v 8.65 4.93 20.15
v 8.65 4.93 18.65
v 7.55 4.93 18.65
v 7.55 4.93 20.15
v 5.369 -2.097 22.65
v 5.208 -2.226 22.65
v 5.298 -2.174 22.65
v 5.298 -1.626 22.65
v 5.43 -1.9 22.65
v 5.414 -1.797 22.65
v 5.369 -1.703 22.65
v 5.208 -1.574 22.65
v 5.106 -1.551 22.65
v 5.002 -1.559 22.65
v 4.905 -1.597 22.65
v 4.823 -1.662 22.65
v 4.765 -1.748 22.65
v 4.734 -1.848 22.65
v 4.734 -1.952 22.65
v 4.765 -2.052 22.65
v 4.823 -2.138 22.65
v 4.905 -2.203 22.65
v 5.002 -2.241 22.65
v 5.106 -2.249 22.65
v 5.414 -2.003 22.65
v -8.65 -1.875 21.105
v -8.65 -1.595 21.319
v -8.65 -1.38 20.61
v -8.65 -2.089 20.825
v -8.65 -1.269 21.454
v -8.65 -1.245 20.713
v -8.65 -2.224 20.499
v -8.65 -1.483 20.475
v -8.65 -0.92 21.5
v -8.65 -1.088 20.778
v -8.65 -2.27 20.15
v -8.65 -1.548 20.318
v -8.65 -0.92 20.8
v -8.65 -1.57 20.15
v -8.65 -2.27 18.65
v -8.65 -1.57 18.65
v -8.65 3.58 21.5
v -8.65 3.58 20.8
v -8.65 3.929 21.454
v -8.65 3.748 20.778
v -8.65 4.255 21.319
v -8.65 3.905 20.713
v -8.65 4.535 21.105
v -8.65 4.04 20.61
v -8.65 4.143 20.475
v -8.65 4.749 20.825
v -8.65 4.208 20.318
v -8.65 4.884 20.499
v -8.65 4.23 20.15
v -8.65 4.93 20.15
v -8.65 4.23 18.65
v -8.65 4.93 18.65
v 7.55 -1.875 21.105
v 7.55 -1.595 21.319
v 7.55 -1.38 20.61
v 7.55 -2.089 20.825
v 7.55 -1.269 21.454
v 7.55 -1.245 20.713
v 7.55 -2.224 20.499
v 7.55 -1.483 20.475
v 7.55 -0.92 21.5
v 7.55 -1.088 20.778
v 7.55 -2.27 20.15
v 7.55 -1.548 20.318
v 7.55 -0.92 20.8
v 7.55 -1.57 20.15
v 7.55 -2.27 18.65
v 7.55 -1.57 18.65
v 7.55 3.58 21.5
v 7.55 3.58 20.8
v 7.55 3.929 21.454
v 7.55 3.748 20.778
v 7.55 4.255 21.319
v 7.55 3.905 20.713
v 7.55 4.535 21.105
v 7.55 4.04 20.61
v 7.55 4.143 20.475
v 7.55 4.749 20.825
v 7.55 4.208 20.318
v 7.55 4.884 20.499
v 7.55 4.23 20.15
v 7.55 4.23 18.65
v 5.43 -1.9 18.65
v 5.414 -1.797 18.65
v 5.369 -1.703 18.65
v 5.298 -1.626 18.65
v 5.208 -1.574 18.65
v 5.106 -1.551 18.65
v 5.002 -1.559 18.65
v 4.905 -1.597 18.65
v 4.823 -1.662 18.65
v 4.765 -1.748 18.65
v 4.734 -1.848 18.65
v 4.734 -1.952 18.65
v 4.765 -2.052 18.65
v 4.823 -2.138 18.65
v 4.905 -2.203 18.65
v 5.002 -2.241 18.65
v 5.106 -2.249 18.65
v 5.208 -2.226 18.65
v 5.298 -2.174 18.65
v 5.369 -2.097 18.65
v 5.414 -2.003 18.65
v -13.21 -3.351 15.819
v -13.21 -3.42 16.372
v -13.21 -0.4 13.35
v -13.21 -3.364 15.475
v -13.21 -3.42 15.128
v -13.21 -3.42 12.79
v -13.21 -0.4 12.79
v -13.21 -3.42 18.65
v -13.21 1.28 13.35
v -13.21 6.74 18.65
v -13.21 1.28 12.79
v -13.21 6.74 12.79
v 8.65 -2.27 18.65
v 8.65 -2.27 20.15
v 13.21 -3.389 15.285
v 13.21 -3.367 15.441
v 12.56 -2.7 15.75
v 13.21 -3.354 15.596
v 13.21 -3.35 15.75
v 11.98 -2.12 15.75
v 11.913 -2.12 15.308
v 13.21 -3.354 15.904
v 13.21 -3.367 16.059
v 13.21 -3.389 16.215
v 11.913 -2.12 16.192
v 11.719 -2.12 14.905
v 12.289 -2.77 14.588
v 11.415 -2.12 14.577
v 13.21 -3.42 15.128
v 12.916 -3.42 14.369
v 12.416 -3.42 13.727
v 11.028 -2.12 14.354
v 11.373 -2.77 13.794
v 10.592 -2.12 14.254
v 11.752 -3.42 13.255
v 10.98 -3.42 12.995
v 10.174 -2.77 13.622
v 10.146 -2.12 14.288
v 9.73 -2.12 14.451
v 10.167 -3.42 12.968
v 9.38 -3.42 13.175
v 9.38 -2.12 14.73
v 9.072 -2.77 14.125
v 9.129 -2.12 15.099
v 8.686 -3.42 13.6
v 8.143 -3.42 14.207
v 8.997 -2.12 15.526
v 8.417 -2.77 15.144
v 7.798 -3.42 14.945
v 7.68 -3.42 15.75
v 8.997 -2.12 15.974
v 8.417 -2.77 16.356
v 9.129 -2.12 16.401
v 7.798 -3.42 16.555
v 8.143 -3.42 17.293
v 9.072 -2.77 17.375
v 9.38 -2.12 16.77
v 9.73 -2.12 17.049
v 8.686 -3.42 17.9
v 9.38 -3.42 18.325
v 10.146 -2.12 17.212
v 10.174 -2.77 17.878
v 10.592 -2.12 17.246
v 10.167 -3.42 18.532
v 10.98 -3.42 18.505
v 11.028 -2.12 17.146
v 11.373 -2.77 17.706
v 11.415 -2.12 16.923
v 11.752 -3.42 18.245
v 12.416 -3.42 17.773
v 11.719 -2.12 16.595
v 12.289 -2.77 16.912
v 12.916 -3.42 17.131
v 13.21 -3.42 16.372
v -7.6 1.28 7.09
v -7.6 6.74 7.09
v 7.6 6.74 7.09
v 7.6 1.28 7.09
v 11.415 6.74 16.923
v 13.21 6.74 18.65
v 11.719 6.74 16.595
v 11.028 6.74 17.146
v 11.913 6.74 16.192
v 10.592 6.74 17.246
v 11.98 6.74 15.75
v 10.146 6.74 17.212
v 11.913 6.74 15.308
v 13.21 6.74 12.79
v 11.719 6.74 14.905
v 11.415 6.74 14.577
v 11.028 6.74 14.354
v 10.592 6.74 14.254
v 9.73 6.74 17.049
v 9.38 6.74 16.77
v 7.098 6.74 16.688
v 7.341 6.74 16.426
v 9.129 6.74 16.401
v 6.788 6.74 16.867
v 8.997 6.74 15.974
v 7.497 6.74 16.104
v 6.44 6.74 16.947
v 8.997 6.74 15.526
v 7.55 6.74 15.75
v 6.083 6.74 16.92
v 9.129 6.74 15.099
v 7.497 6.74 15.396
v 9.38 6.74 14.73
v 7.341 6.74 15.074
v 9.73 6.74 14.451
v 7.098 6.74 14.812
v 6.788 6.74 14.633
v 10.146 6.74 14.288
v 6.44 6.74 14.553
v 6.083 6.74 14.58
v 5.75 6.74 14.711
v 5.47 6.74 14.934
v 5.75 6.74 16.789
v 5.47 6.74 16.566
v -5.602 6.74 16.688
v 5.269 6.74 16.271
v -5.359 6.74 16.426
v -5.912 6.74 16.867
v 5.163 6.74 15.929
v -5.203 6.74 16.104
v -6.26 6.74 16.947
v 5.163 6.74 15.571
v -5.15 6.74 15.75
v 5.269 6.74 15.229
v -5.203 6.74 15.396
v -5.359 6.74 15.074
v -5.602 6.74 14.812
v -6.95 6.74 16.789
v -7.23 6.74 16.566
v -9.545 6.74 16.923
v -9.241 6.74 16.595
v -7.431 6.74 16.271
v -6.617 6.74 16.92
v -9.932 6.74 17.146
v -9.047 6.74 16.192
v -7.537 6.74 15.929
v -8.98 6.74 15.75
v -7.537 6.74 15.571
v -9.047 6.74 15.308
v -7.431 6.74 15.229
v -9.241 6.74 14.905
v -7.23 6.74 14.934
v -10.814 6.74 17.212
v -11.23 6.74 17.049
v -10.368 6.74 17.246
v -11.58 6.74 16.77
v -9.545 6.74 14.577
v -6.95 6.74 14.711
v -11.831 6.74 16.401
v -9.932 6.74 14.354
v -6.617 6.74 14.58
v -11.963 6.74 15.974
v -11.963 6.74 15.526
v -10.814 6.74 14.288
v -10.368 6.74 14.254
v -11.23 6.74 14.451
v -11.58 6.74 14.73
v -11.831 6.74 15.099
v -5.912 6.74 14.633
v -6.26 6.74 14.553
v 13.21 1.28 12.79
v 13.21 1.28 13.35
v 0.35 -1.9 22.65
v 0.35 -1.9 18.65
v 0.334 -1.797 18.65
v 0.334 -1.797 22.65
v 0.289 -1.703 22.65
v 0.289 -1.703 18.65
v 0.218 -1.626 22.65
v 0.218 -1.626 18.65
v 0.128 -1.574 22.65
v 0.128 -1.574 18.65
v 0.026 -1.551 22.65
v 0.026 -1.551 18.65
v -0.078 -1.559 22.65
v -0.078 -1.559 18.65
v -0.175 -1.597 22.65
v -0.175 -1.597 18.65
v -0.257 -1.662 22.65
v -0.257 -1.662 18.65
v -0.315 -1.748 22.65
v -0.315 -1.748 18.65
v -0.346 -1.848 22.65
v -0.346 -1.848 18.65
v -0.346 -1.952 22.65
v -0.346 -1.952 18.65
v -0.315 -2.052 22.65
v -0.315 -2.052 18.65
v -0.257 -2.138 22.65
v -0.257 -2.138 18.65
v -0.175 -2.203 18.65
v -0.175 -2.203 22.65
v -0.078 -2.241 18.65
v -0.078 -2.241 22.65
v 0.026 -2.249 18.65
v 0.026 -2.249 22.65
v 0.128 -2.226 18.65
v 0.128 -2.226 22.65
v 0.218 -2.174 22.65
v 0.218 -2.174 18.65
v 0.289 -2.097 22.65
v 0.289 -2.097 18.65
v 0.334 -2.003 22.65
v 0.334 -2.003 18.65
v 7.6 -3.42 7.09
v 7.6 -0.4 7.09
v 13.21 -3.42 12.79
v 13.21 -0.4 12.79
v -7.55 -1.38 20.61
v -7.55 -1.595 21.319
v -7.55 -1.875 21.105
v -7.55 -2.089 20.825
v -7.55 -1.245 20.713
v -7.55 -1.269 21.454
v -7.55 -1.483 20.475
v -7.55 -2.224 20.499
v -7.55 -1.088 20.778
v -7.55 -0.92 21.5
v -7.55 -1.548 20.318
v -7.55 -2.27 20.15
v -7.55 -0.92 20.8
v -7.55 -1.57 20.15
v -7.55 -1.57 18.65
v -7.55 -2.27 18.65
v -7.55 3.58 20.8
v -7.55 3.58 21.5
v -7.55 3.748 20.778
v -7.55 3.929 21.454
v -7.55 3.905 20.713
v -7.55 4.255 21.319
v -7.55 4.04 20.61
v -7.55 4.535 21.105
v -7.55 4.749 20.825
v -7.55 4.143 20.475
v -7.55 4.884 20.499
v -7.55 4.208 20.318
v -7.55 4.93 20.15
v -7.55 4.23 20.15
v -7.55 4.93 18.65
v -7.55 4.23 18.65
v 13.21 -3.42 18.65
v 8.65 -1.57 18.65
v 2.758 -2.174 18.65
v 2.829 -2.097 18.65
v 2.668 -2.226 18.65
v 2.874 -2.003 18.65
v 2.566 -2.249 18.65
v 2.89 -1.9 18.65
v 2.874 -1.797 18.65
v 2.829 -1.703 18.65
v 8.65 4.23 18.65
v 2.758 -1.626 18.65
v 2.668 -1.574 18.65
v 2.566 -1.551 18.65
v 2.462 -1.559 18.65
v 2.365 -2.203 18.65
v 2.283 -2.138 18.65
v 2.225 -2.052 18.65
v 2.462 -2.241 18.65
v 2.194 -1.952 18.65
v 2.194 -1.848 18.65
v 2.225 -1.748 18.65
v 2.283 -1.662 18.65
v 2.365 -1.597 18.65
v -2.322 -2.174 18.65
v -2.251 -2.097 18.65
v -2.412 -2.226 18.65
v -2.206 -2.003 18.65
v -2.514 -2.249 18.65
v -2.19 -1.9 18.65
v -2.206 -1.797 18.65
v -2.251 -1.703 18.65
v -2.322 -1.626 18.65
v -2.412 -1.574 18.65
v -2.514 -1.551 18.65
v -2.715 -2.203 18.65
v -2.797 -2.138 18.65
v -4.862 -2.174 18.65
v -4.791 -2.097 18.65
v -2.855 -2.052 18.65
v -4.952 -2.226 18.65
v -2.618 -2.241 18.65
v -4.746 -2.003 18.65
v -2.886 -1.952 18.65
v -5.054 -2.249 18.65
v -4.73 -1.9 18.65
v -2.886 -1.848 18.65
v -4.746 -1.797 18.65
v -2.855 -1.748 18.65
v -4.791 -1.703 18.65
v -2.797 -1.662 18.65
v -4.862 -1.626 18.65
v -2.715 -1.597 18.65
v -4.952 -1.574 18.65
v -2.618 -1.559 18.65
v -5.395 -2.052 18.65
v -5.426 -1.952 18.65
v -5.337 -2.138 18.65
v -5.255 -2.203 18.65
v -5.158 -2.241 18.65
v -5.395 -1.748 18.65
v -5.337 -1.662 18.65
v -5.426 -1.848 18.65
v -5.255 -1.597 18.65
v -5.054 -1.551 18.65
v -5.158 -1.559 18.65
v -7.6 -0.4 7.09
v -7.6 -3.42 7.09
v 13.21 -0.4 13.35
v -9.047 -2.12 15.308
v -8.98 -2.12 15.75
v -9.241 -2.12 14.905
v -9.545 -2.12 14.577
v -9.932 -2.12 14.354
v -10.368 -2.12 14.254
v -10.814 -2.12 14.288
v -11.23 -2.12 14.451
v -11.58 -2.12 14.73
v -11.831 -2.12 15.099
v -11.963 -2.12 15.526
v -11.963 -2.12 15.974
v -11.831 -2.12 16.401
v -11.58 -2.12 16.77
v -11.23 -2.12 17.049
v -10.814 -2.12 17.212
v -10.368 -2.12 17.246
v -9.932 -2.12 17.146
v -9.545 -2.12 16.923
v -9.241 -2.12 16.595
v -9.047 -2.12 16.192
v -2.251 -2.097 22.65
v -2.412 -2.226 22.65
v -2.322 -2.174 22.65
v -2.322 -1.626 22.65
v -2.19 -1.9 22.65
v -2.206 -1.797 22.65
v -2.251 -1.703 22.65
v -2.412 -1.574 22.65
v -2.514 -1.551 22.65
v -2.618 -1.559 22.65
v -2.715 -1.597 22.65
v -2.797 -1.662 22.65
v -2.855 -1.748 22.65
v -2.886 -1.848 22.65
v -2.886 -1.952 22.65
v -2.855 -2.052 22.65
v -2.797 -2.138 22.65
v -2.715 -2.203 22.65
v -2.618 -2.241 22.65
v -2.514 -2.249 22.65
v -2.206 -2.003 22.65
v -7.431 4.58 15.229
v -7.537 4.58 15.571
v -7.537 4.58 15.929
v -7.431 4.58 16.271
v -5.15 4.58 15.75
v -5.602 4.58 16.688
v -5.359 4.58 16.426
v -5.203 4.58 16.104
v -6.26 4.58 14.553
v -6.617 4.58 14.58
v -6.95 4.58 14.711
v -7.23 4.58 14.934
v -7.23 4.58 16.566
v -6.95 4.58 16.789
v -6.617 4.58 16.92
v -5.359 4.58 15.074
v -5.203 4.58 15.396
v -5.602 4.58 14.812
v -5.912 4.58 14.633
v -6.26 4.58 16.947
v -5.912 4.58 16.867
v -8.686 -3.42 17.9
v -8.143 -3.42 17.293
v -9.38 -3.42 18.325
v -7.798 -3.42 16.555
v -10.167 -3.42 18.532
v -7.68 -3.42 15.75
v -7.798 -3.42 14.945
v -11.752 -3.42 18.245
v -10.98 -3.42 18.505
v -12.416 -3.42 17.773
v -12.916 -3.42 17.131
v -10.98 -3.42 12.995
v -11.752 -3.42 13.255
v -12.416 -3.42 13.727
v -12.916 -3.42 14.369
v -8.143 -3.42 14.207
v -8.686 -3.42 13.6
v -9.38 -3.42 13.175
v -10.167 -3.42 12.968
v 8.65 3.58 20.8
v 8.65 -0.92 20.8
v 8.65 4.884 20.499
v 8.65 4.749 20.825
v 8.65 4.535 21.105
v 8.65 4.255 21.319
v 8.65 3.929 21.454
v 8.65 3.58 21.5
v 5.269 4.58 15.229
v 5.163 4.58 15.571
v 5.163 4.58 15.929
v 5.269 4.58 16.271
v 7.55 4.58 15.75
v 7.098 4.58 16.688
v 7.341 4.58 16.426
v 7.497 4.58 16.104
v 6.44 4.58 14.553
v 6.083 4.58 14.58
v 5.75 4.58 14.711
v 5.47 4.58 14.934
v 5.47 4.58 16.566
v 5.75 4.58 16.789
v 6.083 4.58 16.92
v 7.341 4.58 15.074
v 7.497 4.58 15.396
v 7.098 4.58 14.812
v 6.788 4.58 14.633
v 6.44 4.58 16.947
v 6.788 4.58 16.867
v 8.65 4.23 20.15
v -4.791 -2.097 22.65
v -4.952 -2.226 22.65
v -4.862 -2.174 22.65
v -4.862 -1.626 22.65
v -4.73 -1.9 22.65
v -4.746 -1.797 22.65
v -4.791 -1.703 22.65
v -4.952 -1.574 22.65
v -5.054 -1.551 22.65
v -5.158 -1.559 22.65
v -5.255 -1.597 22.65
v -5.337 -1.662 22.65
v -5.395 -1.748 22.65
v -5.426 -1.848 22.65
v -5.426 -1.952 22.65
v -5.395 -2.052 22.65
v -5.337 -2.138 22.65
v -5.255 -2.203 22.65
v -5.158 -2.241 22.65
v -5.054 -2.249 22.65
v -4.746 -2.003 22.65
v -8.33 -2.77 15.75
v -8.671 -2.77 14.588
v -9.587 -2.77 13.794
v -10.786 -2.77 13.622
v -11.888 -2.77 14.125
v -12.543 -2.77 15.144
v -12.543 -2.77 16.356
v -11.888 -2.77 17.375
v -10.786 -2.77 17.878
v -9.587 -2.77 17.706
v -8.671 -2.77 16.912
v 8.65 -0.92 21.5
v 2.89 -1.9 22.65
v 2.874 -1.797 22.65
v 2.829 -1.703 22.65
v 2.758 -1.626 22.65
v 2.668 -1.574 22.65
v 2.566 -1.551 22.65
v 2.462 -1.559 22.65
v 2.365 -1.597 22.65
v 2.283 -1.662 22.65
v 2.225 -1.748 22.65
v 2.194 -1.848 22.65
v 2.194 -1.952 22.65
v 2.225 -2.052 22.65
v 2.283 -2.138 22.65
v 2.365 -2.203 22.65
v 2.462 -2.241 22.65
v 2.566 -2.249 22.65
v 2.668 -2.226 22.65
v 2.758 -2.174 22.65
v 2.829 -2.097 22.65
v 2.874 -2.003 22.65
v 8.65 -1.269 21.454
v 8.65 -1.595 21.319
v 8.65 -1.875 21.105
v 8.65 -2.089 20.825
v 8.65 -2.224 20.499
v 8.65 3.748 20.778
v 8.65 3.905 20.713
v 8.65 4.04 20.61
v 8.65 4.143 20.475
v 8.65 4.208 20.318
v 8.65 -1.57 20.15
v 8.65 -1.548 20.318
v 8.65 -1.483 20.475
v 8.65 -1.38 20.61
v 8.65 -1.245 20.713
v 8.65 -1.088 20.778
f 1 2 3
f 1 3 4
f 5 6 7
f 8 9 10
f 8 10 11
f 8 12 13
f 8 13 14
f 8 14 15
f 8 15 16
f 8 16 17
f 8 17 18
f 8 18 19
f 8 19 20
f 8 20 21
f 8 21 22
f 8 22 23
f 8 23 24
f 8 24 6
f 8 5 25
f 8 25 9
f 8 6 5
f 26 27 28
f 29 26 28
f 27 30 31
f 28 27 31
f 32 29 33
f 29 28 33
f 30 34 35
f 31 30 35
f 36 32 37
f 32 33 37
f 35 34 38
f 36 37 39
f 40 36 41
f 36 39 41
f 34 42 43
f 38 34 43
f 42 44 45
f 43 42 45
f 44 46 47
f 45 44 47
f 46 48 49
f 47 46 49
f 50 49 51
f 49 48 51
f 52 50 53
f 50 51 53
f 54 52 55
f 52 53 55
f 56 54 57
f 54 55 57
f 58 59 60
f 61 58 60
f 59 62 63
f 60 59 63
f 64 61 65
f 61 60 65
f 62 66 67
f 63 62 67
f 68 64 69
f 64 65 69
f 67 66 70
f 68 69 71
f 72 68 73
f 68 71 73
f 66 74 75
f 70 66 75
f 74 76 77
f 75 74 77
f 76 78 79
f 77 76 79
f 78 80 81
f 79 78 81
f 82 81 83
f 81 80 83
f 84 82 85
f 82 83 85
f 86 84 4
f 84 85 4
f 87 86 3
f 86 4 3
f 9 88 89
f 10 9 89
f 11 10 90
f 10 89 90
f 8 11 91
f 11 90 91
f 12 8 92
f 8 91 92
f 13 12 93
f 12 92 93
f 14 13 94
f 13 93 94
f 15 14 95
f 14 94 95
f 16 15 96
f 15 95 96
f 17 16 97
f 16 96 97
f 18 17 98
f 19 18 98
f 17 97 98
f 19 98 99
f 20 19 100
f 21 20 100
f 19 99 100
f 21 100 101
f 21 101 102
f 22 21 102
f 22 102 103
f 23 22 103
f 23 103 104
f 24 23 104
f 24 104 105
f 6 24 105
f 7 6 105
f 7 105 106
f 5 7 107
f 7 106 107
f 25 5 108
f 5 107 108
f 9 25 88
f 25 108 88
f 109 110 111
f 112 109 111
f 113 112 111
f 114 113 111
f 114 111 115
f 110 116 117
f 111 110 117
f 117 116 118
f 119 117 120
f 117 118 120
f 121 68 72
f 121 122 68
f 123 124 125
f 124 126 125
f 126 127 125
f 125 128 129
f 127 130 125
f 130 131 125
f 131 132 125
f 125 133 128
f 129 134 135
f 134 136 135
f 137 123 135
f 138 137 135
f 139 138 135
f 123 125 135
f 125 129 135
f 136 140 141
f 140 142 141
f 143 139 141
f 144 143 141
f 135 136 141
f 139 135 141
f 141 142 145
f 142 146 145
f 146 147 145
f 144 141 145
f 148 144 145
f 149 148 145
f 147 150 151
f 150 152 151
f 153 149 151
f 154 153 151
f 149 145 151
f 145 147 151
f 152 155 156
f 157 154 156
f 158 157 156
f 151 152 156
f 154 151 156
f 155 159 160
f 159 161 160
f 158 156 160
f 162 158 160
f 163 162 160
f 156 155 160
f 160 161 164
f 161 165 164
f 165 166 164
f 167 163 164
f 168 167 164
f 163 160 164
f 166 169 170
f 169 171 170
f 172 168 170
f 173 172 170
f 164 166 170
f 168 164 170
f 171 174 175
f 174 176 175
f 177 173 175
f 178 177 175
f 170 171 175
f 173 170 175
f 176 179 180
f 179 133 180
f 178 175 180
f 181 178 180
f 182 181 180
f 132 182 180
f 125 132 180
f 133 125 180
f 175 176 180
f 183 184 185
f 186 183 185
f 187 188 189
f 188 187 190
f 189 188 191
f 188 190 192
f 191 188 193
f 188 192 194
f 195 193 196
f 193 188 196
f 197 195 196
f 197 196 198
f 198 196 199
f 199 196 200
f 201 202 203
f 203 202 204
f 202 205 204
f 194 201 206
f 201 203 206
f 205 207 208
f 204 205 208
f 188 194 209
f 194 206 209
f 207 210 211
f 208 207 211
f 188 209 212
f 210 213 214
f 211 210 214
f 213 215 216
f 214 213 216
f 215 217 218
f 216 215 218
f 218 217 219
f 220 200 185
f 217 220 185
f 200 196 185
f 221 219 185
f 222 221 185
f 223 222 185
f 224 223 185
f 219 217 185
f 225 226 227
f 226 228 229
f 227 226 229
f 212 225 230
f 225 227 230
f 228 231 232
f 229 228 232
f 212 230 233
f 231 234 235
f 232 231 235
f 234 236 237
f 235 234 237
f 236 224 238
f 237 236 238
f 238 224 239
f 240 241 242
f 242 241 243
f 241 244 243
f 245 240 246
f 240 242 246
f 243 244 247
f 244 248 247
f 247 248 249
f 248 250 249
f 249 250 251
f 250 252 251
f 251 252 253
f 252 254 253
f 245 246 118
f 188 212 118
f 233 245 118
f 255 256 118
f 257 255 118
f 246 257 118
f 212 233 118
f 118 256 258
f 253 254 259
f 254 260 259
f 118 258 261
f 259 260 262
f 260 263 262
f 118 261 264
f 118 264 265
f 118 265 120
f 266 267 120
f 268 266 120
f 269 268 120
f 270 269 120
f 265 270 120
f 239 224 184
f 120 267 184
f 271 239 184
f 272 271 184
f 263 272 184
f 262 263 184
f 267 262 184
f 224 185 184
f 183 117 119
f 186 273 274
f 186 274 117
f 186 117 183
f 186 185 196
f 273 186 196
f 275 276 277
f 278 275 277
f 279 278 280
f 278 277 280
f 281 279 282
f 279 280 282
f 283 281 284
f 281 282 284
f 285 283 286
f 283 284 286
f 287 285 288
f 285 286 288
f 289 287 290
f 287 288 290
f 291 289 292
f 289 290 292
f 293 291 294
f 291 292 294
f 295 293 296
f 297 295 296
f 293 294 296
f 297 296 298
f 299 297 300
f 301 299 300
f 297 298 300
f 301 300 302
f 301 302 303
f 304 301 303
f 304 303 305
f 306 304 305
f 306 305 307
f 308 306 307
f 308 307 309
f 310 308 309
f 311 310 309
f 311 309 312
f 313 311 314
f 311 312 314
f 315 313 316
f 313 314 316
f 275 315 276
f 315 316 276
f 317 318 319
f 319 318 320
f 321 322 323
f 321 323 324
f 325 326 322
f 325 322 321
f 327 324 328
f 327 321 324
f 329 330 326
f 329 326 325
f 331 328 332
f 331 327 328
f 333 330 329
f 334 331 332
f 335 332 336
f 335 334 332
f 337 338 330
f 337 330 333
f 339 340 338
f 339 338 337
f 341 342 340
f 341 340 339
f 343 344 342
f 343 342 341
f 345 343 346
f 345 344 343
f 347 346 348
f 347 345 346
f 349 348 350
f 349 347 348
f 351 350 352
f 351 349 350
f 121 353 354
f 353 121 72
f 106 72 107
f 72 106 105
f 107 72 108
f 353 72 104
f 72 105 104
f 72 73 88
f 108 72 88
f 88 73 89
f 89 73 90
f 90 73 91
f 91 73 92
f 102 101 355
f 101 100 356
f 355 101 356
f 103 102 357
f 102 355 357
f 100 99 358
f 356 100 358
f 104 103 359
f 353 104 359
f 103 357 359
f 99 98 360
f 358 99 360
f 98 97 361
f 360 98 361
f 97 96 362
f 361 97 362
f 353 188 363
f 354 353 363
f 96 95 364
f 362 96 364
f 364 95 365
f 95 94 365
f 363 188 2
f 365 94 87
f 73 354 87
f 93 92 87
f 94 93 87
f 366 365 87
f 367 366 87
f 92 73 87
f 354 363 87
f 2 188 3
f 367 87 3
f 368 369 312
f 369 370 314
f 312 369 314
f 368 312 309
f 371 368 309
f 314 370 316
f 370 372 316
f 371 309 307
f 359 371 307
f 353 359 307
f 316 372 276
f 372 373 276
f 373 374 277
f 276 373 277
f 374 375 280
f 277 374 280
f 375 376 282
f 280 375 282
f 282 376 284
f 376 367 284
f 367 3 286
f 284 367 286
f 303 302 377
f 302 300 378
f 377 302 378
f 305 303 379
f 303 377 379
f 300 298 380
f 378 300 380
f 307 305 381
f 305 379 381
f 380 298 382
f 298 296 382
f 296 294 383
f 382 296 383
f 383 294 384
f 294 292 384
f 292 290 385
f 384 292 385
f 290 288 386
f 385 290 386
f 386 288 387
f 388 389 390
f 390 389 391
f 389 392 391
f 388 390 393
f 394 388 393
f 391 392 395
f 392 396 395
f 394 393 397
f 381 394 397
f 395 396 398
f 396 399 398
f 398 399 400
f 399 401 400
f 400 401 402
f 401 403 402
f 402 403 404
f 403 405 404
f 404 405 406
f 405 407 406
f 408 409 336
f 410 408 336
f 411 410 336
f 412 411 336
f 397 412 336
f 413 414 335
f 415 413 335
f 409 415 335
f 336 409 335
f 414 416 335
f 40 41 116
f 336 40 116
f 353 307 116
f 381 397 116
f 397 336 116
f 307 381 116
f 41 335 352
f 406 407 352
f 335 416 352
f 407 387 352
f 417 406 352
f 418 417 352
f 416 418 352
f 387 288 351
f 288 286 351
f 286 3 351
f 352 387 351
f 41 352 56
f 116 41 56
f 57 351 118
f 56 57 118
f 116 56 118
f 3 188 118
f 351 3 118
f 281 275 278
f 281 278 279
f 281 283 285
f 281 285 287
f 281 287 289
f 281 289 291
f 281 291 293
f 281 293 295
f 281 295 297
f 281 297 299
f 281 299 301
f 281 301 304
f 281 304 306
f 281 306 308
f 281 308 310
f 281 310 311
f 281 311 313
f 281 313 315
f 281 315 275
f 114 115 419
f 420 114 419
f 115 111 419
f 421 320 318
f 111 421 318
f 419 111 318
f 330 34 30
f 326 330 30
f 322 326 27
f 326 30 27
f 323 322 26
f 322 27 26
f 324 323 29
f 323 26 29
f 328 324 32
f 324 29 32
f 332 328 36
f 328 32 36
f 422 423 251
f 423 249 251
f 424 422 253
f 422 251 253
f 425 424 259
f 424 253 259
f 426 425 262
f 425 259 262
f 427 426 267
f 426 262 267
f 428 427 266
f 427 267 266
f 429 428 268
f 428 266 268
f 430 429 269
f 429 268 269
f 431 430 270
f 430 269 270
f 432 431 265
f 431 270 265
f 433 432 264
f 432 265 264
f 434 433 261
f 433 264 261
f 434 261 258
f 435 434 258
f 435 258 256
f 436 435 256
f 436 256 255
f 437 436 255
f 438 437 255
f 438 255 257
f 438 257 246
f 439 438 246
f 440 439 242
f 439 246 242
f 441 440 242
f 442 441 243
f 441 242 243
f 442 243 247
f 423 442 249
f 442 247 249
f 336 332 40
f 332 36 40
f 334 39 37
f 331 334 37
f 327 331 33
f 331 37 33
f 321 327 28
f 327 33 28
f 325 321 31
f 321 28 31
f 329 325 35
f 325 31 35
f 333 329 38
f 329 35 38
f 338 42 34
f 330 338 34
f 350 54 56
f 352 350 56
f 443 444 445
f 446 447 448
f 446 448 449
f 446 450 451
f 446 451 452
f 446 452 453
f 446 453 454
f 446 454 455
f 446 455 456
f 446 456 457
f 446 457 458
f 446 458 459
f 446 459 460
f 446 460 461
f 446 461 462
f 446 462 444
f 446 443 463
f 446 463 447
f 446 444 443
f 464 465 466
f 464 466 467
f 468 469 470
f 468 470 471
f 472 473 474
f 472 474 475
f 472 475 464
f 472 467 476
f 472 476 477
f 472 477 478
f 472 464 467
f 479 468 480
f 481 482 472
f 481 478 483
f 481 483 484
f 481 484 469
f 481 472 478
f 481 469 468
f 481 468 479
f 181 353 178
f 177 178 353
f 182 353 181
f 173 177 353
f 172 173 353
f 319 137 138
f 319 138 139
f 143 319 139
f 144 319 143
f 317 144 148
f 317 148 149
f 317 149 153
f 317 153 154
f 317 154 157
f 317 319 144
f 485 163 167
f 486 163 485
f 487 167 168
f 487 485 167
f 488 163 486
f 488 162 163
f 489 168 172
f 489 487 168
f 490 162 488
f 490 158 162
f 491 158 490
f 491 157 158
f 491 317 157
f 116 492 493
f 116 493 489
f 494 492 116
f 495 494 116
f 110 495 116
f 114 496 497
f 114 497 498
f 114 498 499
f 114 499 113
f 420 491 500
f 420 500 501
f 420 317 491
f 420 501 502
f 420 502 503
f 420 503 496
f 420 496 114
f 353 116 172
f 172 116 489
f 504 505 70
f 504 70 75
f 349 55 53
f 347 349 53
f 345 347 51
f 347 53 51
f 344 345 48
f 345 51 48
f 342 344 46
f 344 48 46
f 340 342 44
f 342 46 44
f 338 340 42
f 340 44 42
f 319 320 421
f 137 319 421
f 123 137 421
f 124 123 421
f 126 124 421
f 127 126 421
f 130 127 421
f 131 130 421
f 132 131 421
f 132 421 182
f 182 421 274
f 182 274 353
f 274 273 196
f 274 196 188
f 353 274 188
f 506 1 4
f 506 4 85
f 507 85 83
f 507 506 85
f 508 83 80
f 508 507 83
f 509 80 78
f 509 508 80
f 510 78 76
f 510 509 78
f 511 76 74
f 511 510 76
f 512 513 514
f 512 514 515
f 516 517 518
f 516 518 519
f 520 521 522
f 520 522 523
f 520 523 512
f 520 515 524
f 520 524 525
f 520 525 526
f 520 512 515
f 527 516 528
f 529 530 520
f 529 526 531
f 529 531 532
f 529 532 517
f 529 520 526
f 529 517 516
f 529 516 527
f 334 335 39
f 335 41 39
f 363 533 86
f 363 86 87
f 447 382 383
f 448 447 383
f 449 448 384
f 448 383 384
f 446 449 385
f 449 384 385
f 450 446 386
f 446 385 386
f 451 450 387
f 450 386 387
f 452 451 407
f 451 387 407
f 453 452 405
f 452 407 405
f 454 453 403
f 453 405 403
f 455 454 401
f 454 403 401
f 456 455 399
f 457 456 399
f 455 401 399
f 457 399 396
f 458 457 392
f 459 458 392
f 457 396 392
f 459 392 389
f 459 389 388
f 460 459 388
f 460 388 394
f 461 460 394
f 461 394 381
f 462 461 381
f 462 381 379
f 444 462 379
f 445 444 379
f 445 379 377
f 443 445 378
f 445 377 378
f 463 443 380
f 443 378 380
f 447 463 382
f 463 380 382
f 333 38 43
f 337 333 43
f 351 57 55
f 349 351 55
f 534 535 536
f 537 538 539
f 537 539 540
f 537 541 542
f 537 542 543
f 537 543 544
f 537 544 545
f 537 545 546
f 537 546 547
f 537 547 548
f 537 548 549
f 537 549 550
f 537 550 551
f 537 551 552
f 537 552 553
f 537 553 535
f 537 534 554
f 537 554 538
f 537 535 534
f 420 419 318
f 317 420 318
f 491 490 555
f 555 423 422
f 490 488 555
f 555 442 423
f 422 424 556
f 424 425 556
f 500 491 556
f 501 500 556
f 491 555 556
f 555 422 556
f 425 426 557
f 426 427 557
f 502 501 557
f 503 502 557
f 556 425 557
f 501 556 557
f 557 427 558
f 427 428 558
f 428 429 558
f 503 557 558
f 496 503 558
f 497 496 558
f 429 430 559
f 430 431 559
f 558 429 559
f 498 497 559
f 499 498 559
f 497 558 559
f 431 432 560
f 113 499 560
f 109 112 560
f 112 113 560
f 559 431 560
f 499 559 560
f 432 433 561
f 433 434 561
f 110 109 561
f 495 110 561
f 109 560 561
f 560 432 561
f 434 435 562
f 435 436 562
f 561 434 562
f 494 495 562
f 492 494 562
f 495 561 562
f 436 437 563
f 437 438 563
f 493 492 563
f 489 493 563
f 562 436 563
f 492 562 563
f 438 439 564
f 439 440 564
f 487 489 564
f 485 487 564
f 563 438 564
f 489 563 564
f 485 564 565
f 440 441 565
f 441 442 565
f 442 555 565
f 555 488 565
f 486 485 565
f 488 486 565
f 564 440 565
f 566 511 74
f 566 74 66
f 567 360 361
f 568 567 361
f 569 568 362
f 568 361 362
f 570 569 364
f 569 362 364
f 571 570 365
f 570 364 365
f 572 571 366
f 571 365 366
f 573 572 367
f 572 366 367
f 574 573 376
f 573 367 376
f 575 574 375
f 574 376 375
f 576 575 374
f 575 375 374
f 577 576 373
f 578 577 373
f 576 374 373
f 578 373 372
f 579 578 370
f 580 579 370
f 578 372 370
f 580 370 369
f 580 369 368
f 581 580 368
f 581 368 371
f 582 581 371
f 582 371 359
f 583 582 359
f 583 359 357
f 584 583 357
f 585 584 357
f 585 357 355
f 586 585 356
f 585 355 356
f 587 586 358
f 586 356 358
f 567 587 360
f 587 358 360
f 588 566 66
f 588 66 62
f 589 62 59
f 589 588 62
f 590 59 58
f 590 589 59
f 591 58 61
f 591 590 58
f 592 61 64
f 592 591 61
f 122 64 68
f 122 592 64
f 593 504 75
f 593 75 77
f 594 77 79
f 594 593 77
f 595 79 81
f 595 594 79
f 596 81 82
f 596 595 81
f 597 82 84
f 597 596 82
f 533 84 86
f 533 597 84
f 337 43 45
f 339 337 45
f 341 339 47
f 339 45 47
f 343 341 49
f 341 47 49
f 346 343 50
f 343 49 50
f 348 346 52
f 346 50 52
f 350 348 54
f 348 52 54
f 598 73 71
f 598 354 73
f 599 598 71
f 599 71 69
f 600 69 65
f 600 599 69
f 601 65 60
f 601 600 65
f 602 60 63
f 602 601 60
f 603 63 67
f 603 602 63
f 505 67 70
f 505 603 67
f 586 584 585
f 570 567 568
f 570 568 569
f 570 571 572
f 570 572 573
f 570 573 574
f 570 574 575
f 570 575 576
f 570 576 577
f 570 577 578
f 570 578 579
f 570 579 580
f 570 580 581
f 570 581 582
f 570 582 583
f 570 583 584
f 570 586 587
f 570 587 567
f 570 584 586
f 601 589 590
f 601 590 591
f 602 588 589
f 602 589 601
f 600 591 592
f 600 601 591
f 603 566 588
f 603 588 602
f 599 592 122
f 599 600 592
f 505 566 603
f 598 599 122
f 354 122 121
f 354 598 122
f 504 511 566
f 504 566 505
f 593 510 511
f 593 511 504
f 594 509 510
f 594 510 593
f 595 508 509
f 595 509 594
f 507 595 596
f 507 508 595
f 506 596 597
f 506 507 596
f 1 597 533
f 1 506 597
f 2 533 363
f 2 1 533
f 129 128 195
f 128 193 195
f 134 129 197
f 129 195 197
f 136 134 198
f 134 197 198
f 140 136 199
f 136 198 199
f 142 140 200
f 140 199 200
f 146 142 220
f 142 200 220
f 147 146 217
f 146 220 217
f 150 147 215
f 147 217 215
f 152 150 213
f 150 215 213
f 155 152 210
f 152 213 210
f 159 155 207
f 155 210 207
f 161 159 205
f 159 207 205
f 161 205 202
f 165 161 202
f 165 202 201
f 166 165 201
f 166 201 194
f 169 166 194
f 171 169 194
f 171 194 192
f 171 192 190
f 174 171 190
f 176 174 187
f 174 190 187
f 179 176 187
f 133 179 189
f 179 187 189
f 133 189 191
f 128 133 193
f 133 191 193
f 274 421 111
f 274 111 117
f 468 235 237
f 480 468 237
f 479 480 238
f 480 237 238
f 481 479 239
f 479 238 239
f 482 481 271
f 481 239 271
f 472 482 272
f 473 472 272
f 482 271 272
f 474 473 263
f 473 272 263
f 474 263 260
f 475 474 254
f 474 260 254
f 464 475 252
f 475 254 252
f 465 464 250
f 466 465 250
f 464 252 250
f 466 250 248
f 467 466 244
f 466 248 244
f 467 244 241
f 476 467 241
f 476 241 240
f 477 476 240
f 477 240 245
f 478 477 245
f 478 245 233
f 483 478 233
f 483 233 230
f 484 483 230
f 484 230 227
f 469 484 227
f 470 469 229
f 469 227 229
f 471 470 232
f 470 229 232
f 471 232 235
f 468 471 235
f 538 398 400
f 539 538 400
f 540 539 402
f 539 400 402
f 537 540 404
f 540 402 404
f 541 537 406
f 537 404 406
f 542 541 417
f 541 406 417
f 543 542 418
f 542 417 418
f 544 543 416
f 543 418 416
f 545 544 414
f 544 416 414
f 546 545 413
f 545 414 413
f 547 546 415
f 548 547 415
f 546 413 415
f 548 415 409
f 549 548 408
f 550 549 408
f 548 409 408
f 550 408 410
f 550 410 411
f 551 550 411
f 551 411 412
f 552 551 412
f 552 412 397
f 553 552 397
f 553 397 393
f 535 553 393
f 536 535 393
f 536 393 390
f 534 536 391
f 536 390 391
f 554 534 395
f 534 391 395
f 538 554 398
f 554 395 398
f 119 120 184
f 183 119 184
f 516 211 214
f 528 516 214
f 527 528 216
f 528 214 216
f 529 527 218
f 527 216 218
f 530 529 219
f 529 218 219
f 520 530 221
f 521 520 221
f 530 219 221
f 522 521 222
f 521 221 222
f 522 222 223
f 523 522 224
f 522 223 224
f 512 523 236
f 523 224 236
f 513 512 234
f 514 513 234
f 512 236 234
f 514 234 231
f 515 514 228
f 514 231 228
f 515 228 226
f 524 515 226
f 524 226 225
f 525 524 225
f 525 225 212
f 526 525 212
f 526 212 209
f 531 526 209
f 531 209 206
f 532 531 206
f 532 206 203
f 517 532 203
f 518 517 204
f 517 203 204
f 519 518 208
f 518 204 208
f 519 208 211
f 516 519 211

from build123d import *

# Parameters (mm, degrees)
SKIZZE1_R                                            = 1.385
AUFSATZ_LINEAR_AUSTRAGEN1_DEPTH                      = 6.74
AUFSATZ_LINEAR_AUSTRAGEN1_DEPTH_BACK                 = 3.42
SKIZZE2_W                                            = 16.035180953
SKIZZE2_H                                            = 1.68
SCHNITT_LINEAR_AUSTRAGEN1_DEPTH                      = 14.21
SCHNITT_LINEAR_AUSTRAGEN1_DEPTH_BACK                 = 14.21
SKIZZE3_R                                            = 1.2
SCHNITT_LINEAR_AUSTRAGEN2_DEPTH                      = 2.16
SKIZZE4_R                                            = 0.35
AUFSATZ_LINEAR_AUSTRAGEN2_DEPTH                      = 4
LINEAR_AUSTRAGEN_D_NN1_DEPTH                         = 0.55
FORMSENKUNG_F_R_M3_SENKSCHRAUBE_MIT_SCHL_D           = 3
FORMSENKUNG_F_R_M3_SENKSCHRAUBE_MIT_SCHL_DEPTH       = 11
FORMSENKUNG_F_R_M3_SENKSCHRAUBE_MIT_SCHL_CSINK_D     = 5.6
FORMSENKUNG_F_R_M3_SENKSCHRAUBE_MIT_SCHL_CSINK_ANGLE = 90
FORMSENKUNG_F_R_M3_SENKSCHRAUBE_MIT_SCHL_TIP         = 0.901290929


with BuildPart() as part:
    # Skizze1 → Aufsatz-Linear austragen1 (new body, two sides)
    with BuildSketch(Plane(origin=(0, 0, 0), x_dir=(1, 0, 0), z_dir=(0, 1, 0))) as aufsatz_linear_austragen1_sk:
        Polygon((-13.21, -18.65), (-13.21, -12.79), (-7.6, -7.09), (7.6, -7.09), (13.21, -12.79), (13.21, -18.65), align=None)
        with Locations((-10.48, -15.75)):
            Circle(SKIZZE1_R, mode=Mode.SUBTRACT)
        with Locations((10.48, -15.75)):
            Circle(SKIZZE1_R, mode=Mode.SUBTRACT)
    extrude(amount=AUFSATZ_LINEAR_AUSTRAGEN1_DEPTH)
    extrude(aufsatz_linear_austragen1_sk.sketch, amount=-AUFSATZ_LINEAR_AUSTRAGEN1_DEPTH_BACK)

    # Skizze2 → Schnitt-Linear austragen1 (cut, two sides)
    with BuildSketch(Plane(origin=(0, 0, 0), x_dir=(0, 0, -1), z_dir=(1, 0, 0))) as schnitt_linear_austragen1_sk:
        with Locations((-5.332409524, 0.44)):
            Rectangle(SKIZZE2_W, SKIZZE2_H)
    extrude(amount=SCHNITT_LINEAR_AUSTRAGEN1_DEPTH, mode=Mode.SUBTRACT)
    extrude(schnitt_linear_austragen1_sk.sketch, amount=-SCHNITT_LINEAR_AUSTRAGEN1_DEPTH_BACK, mode=Mode.SUBTRACT)

    # Skizze3 → Schnitt-Linear austragen2 (cut)
    with BuildSketch(Plane(origin=(0, 6.74, 0), x_dir=(1, 0, 0), z_dir=(0, 1, 0))):
        with Locations((6.35, -15.75)):
            Circle(SKIZZE3_R)
        with Locations((-6.35, -15.75)):
            Circle(SKIZZE3_R)
    extrude(amount=-SCHNITT_LINEAR_AUSTRAGEN2_DEPTH, mode=Mode.SUBTRACT)

    # Skizze4 → Aufsatz-Linear austragen2 (add)
    with BuildSketch(Plane.XY.offset(18.65)):
        with Locations((0, -1.9)):
            Circle(SKIZZE4_R)
        with Locations((2.54, -1.9)):
            Circle(SKIZZE4_R)
        with Locations((5.08, -1.9)):
            Circle(SKIZZE4_R)
        with Locations((-2.54, -1.9)):
            Circle(SKIZZE4_R)
        with Locations((-5.08, -1.9)):
            Circle(SKIZZE4_R)
    extrude(amount=AUFSATZ_LINEAR_AUSTRAGEN2_DEPTH)

    # Skizze5 → Linear-Austragen-Dünn1 (add, symmetric)
    with BuildSketch(Plane(origin=(8.1, 0, 0), x_dir=(0, 0, -1), z_dir=(1, 0, 0))):
        with BuildLine():
            Line((-18.65, -1.57), (-20.15, -1.57))
            ThreePointArc((-20.15, -1.57), (-20.609619408, -1.379619408), (-20.8, -0.92))
            Line((-20.8, -0.92), (-20.8, 3.58))
            ThreePointArc((-20.8, 3.58), (-20.609619408, 4.039619408), (-20.15, 4.23))
            Line((-20.15, 4.23), (-18.65, 4.23))
            Line((-18.65, 4.23), (-18.65, 4.93))
            Line((-18.65, 4.93), (-20.15, 4.93))
            ThreePointArc((-20.15, 4.93), (-21.104594155, 4.534594155), (-21.5, 3.58))
            Line((-21.5, 3.58), (-21.5, -0.92))
            ThreePointArc((-21.5, -0.92), (-21.104594155, -1.874594155), (-20.15, -2.27))
            Line((-20.15, -2.27), (-18.65, -2.27))
            Line((-18.65, -2.27), (-18.65, -1.57))
        make_face()
    linear_austragen_d_nn1 = extrude(amount=LINEAR_AUSTRAGEN_D_NN1_DEPTH, both=True)

    # Spiegeln1: Linear-Austragen-Dünn1 across plane
    add(linear_austragen_d_nn1.mirror(Plane(origin=(0, 0, 0), x_dir=(0, 0, 1), z_dir=(1, 0, 0))))

    # Formsenkung für M3 Senkschraube mit Schlitz/Kreuzschlitz1
    with Locations(Plane(origin=(0, -3.42, 0), x_dir=(-1, 0, 0), z_dir=(0, -1, 0))):
        with Locations((-10.48, -15.75), (10.48, -15.75)):
            CounterSinkHole(FORMSENKUNG_F_R_M3_SENKSCHRAUBE_MIT_SCHL_D / 2, FORMSENKUNG_F_R_M3_SENKSCHRAUBE_MIT_SCHL_CSINK_D / 2, depth=FORMSENKUNG_F_R_M3_SENKSCHRAUBE_MIT_SCHL_DEPTH, counter_sink_angle=FORMSENKUNG_F_R_M3_SENKSCHRAUBE_MIT_SCHL_CSINK_ANGLE)
            with Locations((0, 0, -(FORMSENKUNG_F_R_M3_SENKSCHRAUBE_MIT_SCHL_DEPTH + FORMSENKUNG_F_R_M3_SENKSCHRAUBE_MIT_SCHL_TIP / 2))):  # 118° drill point
                Cone(0, FORMSENKUNG_F_R_M3_SENKSCHRAUBE_MIT_SCHL_D / 2, FORMSENKUNG_F_R_M3_SENKSCHRAUBE_MIT_SCHL_TIP, mode=Mode.SUBTRACT)


solid = part.part
